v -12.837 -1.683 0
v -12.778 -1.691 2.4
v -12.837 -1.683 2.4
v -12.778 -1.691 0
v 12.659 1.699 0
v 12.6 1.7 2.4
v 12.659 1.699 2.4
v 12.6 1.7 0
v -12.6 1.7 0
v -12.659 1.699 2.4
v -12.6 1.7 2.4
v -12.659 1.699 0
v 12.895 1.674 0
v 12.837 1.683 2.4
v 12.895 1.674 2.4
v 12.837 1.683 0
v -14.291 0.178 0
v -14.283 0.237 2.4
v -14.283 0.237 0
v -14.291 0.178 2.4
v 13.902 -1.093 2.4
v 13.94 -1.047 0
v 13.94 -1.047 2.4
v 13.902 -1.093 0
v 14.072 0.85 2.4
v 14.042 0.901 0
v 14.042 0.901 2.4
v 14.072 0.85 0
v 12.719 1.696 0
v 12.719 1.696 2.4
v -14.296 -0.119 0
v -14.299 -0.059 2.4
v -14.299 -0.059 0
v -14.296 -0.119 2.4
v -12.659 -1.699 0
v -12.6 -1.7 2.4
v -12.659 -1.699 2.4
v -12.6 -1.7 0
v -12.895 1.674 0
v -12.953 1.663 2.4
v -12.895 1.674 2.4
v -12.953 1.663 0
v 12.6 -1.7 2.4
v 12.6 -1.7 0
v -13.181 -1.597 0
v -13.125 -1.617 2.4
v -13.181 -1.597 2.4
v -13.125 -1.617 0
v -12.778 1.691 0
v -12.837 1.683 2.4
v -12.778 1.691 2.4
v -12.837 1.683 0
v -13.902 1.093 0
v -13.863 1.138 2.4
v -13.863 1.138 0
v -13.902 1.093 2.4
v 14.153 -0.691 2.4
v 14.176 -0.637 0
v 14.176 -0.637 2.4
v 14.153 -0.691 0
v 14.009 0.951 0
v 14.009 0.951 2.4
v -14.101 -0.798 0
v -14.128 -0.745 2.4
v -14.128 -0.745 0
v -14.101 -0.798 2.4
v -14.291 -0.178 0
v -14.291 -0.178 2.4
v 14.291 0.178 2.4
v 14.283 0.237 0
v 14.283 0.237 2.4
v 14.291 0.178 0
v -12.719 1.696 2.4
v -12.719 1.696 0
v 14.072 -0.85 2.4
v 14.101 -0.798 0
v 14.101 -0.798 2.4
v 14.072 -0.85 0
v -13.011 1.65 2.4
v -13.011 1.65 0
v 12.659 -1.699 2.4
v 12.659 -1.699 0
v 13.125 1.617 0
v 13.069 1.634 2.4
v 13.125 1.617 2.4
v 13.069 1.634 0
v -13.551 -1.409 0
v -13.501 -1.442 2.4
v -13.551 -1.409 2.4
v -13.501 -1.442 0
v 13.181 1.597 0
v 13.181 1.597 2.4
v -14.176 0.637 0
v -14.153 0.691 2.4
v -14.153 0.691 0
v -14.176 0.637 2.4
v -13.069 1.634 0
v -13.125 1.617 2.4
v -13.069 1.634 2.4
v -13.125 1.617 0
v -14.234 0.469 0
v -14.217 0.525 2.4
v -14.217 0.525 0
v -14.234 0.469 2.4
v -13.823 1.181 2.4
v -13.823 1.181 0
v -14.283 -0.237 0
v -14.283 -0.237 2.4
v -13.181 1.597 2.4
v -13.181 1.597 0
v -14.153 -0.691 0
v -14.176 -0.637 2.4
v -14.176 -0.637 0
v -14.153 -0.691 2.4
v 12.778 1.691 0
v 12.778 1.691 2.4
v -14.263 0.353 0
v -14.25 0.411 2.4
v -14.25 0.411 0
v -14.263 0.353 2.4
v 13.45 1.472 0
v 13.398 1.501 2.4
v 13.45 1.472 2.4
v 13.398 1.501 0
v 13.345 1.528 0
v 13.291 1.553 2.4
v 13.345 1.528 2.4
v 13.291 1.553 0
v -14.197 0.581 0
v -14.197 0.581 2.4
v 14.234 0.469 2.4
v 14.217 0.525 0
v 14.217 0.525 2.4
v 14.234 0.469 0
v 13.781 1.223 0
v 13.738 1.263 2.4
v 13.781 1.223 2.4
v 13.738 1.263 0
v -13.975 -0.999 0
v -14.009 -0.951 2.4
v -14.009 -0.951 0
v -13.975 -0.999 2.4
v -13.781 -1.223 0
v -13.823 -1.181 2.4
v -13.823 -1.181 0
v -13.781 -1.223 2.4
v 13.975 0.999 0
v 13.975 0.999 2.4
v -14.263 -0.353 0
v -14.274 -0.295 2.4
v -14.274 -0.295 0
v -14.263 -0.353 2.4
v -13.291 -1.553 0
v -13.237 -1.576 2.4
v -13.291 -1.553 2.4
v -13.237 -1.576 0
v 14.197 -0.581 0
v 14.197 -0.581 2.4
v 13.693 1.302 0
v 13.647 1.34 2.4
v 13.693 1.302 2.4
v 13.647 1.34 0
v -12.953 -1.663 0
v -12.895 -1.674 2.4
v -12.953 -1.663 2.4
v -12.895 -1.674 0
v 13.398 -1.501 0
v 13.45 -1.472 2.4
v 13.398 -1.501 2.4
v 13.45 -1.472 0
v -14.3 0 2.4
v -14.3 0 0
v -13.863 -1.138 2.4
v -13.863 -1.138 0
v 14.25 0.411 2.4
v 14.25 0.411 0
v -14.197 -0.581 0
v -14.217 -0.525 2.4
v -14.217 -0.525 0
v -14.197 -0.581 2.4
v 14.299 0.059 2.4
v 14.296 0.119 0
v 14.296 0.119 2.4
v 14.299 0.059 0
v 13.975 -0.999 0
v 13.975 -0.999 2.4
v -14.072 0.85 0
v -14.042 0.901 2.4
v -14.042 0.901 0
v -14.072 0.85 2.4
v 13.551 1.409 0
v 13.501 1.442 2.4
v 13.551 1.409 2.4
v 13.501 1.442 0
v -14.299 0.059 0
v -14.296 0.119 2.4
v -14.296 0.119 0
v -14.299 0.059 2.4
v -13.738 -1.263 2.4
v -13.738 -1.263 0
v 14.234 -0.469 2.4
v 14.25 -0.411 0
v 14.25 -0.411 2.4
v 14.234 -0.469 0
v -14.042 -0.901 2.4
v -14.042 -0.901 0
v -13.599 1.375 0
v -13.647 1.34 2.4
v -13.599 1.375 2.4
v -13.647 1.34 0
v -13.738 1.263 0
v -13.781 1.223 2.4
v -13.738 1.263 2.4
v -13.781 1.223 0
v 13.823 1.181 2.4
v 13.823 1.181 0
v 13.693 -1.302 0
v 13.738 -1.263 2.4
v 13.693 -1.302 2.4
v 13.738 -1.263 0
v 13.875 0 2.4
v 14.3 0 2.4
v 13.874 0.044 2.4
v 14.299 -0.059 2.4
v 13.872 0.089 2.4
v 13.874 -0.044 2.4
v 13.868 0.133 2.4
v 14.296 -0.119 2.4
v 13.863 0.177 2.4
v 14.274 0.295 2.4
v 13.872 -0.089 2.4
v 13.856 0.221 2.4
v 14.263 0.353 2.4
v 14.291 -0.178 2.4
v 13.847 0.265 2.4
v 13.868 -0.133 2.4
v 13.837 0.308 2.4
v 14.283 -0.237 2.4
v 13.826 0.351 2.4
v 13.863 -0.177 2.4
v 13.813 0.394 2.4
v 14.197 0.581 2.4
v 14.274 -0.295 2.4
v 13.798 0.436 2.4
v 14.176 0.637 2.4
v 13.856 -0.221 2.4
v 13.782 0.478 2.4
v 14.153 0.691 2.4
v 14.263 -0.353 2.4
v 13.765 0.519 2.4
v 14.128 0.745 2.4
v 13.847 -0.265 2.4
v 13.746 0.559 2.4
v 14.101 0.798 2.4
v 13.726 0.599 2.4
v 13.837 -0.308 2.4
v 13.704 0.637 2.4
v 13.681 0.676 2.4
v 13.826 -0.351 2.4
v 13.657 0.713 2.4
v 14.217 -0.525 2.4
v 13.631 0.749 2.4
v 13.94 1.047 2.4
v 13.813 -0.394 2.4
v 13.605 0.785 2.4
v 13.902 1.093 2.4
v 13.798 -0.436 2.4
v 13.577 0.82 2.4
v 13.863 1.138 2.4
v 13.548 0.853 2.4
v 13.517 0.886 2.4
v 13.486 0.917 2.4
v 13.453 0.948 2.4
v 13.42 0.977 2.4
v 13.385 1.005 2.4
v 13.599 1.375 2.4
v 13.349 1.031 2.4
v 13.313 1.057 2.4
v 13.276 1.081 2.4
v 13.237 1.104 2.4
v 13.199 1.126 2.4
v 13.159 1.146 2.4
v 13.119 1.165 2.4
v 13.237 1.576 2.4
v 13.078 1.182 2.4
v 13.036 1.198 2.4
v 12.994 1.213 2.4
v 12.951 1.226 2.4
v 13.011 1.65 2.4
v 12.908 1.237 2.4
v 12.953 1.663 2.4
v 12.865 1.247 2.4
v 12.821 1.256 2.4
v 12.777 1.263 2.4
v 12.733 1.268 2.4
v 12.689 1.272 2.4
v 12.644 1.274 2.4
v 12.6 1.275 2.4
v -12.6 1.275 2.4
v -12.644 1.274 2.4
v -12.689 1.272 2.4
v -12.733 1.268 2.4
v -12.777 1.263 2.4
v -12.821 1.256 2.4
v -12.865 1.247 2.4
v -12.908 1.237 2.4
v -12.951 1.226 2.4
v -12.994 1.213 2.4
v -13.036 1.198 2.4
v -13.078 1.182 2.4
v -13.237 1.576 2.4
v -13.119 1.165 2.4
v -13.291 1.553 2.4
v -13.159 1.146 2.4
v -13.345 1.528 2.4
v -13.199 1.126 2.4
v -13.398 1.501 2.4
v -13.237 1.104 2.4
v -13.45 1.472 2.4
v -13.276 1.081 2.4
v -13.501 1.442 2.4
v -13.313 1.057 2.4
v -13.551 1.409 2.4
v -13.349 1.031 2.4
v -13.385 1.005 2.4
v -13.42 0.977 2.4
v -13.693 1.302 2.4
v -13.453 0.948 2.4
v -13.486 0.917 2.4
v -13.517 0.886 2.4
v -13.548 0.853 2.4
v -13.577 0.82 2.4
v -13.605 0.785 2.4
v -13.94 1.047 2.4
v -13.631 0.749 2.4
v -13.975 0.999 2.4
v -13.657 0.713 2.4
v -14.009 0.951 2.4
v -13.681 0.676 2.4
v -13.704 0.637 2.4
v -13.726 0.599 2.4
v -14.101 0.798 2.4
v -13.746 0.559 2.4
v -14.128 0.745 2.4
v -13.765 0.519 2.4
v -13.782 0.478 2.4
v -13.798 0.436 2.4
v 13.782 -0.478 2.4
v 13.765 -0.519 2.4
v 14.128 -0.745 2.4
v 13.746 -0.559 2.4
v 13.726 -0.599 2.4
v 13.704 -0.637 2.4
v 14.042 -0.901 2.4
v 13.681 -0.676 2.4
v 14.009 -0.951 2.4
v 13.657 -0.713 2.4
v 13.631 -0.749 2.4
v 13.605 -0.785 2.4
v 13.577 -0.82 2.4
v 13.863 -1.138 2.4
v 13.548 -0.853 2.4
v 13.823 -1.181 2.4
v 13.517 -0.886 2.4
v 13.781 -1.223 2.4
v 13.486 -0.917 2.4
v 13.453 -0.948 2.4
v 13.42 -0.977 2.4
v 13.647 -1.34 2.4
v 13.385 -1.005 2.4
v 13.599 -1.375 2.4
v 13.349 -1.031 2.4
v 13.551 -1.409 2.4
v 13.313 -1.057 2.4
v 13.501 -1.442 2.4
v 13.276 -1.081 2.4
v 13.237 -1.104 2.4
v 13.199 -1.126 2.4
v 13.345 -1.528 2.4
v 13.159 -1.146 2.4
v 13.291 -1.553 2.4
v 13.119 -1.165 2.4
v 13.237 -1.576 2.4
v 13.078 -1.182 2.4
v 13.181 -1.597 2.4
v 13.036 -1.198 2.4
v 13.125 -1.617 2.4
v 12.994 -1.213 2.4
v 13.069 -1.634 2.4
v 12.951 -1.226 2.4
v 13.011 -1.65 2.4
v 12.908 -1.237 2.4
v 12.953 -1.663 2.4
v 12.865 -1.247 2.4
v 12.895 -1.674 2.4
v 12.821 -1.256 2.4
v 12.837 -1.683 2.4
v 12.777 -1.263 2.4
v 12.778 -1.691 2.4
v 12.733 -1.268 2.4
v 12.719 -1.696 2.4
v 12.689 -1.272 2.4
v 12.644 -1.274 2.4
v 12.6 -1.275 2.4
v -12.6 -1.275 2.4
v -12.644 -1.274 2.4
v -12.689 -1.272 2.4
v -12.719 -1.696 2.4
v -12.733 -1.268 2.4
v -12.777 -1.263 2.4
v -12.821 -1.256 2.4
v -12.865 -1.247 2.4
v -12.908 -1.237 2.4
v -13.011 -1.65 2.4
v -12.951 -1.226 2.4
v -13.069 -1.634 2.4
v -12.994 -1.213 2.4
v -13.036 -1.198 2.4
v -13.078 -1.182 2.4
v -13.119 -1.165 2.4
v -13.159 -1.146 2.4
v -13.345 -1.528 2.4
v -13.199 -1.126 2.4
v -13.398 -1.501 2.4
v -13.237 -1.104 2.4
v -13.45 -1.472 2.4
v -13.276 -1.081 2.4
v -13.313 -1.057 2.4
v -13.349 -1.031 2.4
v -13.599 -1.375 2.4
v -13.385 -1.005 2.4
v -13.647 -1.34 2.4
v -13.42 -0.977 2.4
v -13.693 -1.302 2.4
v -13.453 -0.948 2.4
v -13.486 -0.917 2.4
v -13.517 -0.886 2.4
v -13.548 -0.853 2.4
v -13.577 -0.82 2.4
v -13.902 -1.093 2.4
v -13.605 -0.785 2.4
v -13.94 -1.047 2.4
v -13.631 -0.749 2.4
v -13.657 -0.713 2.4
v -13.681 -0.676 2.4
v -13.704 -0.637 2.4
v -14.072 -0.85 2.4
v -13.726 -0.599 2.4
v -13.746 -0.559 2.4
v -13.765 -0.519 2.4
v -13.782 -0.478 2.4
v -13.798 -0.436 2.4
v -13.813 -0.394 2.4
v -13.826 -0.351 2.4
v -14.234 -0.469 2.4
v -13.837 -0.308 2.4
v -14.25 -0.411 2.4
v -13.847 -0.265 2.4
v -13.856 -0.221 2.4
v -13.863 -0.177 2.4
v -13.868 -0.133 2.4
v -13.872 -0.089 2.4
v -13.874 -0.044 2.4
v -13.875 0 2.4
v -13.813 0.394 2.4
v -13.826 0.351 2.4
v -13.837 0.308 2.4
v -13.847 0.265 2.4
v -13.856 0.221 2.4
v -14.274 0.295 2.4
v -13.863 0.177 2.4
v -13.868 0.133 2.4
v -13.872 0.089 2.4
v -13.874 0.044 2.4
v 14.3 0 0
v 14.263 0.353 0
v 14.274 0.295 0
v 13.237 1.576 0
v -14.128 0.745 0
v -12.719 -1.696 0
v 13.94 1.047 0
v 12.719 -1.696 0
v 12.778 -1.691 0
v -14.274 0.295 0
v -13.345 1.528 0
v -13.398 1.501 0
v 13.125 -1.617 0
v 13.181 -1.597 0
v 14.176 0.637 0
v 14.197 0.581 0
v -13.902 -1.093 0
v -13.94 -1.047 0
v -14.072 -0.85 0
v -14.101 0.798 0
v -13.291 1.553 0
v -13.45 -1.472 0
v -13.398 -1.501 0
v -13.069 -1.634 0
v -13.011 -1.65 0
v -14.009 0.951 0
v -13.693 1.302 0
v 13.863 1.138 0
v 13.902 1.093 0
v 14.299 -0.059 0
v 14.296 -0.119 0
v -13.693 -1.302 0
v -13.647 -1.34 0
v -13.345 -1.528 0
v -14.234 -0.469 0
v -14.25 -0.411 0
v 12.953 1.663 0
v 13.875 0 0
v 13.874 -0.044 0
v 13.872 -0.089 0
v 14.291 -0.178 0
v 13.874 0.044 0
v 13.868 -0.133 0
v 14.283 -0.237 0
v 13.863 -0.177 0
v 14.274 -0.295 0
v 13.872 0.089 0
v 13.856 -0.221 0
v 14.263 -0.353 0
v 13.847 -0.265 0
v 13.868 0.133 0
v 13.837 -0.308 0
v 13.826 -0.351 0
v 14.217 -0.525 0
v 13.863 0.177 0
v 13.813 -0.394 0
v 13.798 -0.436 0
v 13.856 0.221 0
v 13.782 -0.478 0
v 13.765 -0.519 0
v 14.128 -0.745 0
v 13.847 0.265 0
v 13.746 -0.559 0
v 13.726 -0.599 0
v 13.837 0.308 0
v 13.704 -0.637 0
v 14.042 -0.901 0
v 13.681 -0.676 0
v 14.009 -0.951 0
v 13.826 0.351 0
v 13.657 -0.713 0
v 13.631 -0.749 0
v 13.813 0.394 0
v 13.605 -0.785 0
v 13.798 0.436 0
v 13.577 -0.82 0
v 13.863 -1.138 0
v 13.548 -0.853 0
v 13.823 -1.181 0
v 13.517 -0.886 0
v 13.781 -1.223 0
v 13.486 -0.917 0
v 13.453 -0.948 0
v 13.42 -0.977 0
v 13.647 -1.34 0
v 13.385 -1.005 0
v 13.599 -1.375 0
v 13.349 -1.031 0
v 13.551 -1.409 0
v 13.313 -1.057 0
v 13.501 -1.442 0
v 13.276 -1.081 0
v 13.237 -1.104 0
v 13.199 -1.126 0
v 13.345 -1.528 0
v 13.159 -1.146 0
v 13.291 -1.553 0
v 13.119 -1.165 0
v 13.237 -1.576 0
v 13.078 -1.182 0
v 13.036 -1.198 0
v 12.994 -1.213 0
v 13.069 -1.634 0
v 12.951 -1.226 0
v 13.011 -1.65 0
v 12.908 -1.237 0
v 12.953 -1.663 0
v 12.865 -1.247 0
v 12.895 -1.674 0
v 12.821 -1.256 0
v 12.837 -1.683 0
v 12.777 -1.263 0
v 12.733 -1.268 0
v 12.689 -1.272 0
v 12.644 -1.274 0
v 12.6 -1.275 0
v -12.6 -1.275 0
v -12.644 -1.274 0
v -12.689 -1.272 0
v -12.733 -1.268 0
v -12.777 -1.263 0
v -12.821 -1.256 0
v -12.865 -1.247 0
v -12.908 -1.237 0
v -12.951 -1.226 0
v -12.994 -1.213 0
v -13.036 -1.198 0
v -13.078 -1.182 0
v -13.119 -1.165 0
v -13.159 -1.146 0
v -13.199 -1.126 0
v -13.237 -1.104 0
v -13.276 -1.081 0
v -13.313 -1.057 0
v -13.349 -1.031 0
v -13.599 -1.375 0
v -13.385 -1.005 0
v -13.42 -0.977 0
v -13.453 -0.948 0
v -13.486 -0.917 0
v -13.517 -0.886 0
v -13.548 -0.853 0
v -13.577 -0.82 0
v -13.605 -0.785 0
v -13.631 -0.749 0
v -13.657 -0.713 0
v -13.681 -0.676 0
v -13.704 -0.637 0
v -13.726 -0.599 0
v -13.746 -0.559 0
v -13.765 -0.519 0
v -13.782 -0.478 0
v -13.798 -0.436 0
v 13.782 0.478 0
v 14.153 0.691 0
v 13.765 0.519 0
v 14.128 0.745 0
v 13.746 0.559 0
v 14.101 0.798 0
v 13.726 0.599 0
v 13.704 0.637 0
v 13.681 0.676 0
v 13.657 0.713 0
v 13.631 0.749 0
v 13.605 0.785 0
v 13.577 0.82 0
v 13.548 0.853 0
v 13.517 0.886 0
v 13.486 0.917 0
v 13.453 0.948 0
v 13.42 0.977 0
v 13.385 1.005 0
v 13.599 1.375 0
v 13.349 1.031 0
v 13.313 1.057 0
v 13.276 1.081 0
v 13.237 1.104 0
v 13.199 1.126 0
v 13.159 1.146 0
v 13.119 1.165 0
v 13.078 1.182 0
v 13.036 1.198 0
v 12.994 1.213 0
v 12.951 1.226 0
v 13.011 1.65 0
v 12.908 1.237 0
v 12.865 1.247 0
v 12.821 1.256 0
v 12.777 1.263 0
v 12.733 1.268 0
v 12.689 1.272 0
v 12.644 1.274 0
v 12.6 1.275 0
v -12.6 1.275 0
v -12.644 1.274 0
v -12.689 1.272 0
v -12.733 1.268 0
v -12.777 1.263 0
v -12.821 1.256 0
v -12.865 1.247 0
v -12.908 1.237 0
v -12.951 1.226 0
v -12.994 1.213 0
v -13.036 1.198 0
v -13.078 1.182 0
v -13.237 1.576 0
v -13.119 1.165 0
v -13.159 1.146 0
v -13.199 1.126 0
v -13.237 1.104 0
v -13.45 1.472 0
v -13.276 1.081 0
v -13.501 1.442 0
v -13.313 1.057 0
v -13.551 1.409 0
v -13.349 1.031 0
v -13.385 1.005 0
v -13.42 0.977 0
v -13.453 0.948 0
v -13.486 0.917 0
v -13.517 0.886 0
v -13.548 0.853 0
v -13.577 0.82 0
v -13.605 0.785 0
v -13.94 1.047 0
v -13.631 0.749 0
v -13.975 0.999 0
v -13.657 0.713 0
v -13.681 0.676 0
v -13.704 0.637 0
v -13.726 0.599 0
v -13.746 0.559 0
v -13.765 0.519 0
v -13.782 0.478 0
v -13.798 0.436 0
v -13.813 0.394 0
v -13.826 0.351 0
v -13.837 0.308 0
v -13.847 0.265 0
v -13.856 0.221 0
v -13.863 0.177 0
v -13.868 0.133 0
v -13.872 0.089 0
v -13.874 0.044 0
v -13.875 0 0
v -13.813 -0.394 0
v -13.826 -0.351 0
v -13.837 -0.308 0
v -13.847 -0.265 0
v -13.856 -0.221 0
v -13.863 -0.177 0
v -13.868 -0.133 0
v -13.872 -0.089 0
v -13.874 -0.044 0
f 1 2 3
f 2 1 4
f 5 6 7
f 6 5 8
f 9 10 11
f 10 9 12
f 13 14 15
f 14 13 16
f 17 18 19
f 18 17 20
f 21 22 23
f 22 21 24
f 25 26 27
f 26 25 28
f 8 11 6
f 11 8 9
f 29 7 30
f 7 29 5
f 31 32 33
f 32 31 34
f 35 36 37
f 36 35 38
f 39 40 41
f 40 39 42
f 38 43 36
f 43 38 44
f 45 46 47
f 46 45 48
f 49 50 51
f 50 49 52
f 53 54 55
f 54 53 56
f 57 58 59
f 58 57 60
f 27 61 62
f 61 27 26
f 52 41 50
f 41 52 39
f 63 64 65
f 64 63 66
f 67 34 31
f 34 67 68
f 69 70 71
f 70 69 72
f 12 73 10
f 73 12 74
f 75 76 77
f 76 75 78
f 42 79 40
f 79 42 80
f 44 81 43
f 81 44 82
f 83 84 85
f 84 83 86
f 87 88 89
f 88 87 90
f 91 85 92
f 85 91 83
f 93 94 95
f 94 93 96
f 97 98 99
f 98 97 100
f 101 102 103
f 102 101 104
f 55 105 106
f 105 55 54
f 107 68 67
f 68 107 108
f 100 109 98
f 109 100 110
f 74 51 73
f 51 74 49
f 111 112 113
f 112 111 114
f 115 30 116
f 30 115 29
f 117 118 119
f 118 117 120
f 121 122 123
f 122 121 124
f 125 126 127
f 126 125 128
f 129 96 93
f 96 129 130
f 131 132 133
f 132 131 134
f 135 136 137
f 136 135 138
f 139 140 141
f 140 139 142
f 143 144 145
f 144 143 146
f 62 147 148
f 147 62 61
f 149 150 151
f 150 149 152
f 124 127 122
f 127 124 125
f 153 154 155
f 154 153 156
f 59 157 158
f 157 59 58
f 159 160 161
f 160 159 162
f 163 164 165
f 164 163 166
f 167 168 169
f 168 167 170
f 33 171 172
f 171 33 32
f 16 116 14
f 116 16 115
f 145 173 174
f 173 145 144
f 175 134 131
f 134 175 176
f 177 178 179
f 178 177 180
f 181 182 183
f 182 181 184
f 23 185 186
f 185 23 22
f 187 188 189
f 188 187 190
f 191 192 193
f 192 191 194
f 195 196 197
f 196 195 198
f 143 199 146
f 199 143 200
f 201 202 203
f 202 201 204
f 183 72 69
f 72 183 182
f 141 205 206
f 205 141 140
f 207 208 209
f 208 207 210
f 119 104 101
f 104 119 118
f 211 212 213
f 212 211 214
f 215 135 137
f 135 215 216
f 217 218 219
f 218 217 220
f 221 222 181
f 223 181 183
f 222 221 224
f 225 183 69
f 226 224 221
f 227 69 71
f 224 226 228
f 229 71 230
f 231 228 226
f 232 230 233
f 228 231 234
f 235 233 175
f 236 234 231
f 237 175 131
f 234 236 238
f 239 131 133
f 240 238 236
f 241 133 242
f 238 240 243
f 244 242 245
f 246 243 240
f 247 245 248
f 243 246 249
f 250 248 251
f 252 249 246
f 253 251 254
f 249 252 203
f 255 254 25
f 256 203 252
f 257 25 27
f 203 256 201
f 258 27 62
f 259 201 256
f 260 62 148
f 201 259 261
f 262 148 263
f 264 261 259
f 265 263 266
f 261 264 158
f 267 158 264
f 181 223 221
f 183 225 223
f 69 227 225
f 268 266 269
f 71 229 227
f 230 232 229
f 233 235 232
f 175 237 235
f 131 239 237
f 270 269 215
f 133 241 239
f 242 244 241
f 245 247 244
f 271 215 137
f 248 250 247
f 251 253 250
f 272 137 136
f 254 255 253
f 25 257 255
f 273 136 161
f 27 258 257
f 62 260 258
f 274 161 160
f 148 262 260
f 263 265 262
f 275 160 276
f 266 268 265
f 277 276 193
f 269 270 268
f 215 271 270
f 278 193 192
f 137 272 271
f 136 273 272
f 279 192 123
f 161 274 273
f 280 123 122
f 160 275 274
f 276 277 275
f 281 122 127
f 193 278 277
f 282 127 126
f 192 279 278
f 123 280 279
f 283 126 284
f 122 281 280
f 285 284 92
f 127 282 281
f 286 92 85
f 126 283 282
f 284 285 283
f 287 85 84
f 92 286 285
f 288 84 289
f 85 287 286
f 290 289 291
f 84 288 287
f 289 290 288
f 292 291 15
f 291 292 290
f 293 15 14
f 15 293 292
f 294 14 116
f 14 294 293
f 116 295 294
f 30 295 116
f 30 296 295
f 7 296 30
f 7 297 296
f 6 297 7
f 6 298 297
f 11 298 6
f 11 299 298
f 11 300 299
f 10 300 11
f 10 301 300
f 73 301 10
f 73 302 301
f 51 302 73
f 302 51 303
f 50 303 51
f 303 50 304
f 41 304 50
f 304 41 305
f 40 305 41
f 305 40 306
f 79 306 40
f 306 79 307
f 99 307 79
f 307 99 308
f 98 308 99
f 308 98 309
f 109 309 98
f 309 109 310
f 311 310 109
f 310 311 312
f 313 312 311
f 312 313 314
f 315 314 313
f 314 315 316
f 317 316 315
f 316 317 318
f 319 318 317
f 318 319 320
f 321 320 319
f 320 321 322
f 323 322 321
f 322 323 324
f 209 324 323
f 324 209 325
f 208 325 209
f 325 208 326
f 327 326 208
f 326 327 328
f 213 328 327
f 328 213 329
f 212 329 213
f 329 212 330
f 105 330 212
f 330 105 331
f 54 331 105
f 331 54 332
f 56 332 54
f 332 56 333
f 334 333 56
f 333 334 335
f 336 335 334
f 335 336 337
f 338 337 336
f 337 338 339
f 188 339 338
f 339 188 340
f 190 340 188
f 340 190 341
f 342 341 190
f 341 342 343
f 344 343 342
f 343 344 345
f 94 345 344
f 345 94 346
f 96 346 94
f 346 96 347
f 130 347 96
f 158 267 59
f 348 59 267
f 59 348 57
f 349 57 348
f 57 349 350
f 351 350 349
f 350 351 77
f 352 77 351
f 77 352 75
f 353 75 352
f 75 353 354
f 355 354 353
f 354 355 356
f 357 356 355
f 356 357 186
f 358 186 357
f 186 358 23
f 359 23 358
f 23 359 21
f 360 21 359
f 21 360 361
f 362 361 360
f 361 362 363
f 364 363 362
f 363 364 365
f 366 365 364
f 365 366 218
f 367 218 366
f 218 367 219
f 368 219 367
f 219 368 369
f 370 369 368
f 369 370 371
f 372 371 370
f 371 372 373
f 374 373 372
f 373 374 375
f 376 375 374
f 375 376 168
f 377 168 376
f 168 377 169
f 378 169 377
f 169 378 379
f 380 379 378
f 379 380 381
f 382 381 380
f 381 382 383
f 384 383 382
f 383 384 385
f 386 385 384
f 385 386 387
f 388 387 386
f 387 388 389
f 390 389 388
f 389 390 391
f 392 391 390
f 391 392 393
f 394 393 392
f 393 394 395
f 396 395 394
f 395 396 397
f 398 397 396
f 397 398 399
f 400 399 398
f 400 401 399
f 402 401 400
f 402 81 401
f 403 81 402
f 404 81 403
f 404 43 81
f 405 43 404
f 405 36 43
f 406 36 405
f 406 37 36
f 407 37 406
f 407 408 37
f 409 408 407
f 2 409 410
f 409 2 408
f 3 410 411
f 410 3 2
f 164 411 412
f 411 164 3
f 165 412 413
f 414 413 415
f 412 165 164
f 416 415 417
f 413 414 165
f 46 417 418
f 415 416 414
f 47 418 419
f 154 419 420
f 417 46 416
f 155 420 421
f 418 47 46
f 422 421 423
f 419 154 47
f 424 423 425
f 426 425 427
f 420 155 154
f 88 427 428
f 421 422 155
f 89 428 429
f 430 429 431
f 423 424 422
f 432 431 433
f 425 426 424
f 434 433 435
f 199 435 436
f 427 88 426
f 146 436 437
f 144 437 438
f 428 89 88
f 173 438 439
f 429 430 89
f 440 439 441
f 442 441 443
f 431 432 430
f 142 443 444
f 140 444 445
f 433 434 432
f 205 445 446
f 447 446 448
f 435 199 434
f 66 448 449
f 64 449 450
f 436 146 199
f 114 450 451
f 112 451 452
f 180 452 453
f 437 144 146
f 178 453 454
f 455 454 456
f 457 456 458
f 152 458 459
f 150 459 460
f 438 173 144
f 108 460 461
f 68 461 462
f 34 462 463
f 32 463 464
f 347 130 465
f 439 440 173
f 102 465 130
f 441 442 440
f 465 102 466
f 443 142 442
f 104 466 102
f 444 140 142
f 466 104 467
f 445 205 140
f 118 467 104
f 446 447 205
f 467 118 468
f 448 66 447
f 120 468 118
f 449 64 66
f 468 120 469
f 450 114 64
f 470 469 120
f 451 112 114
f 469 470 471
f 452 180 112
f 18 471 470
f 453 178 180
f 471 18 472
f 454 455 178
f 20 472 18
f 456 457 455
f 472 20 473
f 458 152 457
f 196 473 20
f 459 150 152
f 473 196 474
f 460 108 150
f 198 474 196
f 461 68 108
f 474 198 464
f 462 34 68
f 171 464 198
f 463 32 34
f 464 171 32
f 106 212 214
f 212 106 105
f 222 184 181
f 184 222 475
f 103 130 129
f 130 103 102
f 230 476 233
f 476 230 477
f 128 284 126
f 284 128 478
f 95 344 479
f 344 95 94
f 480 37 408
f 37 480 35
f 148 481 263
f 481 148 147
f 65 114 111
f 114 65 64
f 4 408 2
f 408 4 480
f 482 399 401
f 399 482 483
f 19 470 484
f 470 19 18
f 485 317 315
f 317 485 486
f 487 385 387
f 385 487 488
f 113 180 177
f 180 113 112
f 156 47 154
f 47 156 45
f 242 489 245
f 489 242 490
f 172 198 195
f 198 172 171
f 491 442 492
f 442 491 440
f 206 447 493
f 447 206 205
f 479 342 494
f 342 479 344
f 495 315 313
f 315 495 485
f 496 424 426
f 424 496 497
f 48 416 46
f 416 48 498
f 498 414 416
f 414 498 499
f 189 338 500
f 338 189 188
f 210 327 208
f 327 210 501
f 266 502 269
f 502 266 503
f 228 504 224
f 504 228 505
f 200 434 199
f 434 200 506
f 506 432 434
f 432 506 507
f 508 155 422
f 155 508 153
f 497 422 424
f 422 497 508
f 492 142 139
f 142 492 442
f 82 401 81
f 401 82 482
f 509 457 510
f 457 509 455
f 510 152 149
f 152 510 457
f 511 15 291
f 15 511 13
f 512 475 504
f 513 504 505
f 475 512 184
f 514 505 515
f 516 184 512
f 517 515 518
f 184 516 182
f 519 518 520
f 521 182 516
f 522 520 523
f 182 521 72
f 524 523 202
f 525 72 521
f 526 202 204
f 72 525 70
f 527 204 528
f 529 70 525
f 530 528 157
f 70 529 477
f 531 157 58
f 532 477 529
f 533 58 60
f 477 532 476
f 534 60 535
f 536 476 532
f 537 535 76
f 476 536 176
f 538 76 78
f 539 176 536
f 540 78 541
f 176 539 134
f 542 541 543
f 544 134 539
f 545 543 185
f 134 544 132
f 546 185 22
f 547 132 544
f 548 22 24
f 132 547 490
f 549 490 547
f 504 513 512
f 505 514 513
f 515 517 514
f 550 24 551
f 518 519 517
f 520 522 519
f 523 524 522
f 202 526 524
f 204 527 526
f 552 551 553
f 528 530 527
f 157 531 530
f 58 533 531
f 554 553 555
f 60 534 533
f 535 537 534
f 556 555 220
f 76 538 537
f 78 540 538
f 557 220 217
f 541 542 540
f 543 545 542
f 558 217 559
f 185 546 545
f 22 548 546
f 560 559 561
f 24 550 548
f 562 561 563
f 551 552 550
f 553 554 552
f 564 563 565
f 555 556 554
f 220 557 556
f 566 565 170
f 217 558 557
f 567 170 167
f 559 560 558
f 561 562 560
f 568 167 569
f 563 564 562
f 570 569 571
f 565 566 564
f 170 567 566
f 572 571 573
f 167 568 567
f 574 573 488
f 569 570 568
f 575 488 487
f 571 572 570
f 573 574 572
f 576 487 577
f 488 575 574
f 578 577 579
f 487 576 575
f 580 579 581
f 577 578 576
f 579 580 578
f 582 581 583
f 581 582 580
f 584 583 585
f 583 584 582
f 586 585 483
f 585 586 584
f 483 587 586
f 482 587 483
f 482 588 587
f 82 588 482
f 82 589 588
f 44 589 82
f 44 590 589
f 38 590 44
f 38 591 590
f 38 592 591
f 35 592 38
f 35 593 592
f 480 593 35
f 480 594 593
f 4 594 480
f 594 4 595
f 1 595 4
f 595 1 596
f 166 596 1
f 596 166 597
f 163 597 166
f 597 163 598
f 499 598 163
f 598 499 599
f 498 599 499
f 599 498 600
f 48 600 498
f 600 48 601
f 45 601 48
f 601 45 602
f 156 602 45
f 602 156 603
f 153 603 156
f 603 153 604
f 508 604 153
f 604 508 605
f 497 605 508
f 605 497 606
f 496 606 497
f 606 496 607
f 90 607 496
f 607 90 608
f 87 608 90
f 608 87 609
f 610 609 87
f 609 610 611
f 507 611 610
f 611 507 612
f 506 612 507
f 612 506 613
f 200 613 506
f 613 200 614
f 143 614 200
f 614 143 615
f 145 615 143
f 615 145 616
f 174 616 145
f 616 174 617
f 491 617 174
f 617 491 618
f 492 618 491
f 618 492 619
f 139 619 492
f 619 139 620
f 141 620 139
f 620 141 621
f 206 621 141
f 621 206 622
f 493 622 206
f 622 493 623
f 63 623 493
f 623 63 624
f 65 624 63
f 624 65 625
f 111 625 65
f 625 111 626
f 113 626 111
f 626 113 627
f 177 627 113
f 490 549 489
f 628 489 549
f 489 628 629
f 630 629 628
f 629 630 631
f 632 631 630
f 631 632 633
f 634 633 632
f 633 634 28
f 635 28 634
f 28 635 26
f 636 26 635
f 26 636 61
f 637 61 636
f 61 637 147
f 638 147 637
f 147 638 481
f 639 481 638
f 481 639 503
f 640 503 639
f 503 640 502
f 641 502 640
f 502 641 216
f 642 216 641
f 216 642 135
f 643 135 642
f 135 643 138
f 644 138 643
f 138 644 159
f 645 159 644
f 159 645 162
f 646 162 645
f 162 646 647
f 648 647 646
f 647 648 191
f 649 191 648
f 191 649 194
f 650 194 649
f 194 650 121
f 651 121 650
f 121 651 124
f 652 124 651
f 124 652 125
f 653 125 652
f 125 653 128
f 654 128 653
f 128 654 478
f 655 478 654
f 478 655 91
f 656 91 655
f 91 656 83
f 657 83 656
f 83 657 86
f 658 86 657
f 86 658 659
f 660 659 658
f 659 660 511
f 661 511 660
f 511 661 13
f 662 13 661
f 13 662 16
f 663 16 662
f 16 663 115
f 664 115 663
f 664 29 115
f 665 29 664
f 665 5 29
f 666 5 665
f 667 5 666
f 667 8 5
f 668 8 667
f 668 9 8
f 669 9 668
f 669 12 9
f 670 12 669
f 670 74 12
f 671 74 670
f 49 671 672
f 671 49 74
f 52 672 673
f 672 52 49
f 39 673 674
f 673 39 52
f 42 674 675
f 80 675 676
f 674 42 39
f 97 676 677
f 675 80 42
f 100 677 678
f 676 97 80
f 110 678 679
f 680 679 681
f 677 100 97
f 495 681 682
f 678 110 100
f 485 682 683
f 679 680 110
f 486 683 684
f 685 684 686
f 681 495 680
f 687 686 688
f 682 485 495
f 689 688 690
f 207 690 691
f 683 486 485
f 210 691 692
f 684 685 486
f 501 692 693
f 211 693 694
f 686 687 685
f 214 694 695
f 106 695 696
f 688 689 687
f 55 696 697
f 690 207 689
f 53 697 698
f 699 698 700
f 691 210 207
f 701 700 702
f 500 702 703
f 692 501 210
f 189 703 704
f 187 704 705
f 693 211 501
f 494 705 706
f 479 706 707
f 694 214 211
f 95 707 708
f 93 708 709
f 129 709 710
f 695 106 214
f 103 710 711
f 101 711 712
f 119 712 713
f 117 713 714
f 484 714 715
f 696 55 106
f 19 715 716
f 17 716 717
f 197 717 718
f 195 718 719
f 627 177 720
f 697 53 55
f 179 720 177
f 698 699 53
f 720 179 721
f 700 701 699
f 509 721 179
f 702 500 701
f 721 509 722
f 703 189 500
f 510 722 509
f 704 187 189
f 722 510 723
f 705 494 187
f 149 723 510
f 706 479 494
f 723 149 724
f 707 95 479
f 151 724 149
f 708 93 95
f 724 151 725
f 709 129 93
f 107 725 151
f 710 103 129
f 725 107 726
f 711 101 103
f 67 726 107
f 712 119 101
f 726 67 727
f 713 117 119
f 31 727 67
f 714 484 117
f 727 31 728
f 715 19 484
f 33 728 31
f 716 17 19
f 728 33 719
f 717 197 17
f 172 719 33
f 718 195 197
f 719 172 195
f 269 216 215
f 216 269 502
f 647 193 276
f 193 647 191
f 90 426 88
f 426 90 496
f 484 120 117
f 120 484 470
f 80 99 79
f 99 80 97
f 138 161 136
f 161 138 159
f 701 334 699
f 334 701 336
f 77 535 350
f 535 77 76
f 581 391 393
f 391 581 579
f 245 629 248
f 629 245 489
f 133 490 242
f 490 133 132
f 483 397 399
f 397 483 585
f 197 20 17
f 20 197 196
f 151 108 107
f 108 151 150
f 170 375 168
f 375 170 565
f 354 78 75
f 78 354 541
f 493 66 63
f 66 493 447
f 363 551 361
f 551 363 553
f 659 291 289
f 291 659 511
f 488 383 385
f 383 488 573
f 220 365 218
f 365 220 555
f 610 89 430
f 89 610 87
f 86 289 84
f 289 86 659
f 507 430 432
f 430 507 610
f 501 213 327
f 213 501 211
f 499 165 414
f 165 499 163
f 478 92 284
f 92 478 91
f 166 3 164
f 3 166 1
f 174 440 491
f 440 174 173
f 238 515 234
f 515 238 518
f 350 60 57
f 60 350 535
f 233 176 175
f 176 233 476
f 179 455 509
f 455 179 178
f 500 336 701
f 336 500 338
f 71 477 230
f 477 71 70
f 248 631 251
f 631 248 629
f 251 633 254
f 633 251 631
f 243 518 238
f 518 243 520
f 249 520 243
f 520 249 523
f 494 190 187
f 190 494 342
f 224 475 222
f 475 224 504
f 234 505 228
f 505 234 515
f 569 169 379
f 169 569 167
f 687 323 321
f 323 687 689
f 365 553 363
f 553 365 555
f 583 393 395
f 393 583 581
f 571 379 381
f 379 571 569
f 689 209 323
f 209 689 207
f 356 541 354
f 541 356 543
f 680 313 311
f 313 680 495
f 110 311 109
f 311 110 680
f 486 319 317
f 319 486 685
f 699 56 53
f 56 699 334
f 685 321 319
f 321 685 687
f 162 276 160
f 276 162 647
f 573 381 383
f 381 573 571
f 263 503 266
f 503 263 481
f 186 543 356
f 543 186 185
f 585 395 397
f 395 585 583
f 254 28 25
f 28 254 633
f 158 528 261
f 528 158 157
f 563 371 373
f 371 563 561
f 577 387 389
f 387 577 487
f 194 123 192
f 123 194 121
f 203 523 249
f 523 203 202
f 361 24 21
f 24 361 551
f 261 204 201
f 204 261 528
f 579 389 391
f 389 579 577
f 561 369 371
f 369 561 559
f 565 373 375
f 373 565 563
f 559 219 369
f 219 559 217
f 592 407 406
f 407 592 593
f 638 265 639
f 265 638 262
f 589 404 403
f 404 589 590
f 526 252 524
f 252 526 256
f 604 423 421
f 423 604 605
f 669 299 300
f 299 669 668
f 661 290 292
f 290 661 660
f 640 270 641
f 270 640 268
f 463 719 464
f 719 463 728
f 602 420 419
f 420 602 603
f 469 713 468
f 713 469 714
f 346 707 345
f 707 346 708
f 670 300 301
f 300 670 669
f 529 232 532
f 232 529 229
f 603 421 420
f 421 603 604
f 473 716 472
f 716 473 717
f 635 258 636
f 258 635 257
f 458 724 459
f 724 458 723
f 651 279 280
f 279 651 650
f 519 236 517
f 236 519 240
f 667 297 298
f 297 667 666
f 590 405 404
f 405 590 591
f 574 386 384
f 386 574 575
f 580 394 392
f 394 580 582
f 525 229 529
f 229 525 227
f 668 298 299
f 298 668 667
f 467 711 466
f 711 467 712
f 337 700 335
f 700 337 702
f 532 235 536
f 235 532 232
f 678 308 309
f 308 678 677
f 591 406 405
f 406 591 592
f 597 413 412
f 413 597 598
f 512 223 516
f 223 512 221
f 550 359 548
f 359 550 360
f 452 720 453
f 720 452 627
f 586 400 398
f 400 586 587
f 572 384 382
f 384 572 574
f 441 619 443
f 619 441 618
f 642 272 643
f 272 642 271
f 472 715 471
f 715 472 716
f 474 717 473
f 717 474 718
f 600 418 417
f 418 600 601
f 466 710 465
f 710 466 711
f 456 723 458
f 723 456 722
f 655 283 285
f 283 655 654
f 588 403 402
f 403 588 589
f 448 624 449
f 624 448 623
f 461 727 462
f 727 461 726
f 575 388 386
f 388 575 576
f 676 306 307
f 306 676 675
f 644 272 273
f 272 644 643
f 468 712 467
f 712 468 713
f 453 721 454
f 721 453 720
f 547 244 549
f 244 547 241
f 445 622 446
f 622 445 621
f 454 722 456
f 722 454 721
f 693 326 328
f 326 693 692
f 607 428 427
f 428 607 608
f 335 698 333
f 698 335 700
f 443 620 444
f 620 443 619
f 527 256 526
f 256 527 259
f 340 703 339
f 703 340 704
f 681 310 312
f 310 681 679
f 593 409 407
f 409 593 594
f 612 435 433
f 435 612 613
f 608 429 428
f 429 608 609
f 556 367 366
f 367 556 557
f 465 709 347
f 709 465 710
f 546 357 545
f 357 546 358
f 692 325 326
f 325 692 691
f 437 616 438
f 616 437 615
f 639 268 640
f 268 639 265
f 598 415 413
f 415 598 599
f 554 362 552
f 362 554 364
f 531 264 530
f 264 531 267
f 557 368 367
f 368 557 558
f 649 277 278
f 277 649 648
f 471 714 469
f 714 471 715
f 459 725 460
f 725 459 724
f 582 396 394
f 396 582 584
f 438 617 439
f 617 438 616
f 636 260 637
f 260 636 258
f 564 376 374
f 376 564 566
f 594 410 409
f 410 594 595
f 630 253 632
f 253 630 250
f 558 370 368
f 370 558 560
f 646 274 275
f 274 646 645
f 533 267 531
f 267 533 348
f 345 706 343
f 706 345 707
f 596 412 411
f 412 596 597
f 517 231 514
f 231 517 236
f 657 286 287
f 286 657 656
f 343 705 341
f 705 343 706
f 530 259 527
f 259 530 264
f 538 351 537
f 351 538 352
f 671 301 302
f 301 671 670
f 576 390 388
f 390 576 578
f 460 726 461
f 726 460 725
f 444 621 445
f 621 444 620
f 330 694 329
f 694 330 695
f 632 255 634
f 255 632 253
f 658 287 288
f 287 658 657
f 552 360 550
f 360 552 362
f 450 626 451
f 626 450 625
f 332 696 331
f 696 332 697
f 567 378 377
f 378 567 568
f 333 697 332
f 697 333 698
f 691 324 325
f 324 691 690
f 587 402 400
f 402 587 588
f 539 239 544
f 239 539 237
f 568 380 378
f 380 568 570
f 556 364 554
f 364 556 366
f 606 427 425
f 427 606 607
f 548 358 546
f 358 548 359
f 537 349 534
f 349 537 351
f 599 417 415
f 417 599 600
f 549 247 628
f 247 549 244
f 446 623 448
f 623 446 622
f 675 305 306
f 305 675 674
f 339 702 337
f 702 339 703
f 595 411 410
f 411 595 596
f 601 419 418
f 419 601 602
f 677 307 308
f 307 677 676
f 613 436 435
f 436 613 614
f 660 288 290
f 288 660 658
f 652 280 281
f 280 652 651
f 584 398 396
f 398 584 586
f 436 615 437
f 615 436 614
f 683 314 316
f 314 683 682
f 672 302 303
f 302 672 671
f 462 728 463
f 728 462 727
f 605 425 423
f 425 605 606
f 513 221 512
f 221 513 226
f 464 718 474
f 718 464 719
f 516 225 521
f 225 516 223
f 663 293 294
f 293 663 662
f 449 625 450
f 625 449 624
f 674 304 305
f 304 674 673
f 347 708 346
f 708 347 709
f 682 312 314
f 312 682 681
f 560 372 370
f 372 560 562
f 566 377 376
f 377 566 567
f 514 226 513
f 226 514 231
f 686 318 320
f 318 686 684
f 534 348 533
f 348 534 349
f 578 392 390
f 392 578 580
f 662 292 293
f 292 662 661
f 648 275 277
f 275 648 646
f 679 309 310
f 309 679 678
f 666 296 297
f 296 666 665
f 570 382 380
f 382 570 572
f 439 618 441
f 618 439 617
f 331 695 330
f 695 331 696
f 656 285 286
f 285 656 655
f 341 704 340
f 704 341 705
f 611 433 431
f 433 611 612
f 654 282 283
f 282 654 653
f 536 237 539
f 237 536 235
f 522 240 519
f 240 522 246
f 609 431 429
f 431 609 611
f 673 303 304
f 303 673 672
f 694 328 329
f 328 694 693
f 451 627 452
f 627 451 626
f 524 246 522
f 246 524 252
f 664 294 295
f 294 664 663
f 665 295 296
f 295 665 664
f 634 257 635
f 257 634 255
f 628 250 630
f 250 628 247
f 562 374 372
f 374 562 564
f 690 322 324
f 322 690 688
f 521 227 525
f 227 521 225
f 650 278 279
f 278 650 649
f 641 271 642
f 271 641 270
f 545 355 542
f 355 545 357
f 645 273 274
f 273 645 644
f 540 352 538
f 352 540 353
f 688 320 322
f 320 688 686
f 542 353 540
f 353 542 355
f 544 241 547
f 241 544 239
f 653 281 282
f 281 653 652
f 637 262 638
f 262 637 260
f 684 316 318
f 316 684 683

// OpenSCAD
height=3.4;
width=28.6;
depth=2.4;

difference() {
    hull() {
        translate([-width/2+height/2, 0, 0])
        cylinder(h=depth, d=height, $fn=180);
        
        translate([width/2-height/2, 0, 0])
        cylinder(h=depth, d=height, $fn=180);
    }
    
    hull() {
        translate([-width/2+height/2, 0, 0])
        cylinder(h=depth, d=height*.75, $fn=180);
        
        translate([width/2-height/2, 0, 0])
        cylinder(h=depth, d=height*.75, $fn=180);
    }
}
